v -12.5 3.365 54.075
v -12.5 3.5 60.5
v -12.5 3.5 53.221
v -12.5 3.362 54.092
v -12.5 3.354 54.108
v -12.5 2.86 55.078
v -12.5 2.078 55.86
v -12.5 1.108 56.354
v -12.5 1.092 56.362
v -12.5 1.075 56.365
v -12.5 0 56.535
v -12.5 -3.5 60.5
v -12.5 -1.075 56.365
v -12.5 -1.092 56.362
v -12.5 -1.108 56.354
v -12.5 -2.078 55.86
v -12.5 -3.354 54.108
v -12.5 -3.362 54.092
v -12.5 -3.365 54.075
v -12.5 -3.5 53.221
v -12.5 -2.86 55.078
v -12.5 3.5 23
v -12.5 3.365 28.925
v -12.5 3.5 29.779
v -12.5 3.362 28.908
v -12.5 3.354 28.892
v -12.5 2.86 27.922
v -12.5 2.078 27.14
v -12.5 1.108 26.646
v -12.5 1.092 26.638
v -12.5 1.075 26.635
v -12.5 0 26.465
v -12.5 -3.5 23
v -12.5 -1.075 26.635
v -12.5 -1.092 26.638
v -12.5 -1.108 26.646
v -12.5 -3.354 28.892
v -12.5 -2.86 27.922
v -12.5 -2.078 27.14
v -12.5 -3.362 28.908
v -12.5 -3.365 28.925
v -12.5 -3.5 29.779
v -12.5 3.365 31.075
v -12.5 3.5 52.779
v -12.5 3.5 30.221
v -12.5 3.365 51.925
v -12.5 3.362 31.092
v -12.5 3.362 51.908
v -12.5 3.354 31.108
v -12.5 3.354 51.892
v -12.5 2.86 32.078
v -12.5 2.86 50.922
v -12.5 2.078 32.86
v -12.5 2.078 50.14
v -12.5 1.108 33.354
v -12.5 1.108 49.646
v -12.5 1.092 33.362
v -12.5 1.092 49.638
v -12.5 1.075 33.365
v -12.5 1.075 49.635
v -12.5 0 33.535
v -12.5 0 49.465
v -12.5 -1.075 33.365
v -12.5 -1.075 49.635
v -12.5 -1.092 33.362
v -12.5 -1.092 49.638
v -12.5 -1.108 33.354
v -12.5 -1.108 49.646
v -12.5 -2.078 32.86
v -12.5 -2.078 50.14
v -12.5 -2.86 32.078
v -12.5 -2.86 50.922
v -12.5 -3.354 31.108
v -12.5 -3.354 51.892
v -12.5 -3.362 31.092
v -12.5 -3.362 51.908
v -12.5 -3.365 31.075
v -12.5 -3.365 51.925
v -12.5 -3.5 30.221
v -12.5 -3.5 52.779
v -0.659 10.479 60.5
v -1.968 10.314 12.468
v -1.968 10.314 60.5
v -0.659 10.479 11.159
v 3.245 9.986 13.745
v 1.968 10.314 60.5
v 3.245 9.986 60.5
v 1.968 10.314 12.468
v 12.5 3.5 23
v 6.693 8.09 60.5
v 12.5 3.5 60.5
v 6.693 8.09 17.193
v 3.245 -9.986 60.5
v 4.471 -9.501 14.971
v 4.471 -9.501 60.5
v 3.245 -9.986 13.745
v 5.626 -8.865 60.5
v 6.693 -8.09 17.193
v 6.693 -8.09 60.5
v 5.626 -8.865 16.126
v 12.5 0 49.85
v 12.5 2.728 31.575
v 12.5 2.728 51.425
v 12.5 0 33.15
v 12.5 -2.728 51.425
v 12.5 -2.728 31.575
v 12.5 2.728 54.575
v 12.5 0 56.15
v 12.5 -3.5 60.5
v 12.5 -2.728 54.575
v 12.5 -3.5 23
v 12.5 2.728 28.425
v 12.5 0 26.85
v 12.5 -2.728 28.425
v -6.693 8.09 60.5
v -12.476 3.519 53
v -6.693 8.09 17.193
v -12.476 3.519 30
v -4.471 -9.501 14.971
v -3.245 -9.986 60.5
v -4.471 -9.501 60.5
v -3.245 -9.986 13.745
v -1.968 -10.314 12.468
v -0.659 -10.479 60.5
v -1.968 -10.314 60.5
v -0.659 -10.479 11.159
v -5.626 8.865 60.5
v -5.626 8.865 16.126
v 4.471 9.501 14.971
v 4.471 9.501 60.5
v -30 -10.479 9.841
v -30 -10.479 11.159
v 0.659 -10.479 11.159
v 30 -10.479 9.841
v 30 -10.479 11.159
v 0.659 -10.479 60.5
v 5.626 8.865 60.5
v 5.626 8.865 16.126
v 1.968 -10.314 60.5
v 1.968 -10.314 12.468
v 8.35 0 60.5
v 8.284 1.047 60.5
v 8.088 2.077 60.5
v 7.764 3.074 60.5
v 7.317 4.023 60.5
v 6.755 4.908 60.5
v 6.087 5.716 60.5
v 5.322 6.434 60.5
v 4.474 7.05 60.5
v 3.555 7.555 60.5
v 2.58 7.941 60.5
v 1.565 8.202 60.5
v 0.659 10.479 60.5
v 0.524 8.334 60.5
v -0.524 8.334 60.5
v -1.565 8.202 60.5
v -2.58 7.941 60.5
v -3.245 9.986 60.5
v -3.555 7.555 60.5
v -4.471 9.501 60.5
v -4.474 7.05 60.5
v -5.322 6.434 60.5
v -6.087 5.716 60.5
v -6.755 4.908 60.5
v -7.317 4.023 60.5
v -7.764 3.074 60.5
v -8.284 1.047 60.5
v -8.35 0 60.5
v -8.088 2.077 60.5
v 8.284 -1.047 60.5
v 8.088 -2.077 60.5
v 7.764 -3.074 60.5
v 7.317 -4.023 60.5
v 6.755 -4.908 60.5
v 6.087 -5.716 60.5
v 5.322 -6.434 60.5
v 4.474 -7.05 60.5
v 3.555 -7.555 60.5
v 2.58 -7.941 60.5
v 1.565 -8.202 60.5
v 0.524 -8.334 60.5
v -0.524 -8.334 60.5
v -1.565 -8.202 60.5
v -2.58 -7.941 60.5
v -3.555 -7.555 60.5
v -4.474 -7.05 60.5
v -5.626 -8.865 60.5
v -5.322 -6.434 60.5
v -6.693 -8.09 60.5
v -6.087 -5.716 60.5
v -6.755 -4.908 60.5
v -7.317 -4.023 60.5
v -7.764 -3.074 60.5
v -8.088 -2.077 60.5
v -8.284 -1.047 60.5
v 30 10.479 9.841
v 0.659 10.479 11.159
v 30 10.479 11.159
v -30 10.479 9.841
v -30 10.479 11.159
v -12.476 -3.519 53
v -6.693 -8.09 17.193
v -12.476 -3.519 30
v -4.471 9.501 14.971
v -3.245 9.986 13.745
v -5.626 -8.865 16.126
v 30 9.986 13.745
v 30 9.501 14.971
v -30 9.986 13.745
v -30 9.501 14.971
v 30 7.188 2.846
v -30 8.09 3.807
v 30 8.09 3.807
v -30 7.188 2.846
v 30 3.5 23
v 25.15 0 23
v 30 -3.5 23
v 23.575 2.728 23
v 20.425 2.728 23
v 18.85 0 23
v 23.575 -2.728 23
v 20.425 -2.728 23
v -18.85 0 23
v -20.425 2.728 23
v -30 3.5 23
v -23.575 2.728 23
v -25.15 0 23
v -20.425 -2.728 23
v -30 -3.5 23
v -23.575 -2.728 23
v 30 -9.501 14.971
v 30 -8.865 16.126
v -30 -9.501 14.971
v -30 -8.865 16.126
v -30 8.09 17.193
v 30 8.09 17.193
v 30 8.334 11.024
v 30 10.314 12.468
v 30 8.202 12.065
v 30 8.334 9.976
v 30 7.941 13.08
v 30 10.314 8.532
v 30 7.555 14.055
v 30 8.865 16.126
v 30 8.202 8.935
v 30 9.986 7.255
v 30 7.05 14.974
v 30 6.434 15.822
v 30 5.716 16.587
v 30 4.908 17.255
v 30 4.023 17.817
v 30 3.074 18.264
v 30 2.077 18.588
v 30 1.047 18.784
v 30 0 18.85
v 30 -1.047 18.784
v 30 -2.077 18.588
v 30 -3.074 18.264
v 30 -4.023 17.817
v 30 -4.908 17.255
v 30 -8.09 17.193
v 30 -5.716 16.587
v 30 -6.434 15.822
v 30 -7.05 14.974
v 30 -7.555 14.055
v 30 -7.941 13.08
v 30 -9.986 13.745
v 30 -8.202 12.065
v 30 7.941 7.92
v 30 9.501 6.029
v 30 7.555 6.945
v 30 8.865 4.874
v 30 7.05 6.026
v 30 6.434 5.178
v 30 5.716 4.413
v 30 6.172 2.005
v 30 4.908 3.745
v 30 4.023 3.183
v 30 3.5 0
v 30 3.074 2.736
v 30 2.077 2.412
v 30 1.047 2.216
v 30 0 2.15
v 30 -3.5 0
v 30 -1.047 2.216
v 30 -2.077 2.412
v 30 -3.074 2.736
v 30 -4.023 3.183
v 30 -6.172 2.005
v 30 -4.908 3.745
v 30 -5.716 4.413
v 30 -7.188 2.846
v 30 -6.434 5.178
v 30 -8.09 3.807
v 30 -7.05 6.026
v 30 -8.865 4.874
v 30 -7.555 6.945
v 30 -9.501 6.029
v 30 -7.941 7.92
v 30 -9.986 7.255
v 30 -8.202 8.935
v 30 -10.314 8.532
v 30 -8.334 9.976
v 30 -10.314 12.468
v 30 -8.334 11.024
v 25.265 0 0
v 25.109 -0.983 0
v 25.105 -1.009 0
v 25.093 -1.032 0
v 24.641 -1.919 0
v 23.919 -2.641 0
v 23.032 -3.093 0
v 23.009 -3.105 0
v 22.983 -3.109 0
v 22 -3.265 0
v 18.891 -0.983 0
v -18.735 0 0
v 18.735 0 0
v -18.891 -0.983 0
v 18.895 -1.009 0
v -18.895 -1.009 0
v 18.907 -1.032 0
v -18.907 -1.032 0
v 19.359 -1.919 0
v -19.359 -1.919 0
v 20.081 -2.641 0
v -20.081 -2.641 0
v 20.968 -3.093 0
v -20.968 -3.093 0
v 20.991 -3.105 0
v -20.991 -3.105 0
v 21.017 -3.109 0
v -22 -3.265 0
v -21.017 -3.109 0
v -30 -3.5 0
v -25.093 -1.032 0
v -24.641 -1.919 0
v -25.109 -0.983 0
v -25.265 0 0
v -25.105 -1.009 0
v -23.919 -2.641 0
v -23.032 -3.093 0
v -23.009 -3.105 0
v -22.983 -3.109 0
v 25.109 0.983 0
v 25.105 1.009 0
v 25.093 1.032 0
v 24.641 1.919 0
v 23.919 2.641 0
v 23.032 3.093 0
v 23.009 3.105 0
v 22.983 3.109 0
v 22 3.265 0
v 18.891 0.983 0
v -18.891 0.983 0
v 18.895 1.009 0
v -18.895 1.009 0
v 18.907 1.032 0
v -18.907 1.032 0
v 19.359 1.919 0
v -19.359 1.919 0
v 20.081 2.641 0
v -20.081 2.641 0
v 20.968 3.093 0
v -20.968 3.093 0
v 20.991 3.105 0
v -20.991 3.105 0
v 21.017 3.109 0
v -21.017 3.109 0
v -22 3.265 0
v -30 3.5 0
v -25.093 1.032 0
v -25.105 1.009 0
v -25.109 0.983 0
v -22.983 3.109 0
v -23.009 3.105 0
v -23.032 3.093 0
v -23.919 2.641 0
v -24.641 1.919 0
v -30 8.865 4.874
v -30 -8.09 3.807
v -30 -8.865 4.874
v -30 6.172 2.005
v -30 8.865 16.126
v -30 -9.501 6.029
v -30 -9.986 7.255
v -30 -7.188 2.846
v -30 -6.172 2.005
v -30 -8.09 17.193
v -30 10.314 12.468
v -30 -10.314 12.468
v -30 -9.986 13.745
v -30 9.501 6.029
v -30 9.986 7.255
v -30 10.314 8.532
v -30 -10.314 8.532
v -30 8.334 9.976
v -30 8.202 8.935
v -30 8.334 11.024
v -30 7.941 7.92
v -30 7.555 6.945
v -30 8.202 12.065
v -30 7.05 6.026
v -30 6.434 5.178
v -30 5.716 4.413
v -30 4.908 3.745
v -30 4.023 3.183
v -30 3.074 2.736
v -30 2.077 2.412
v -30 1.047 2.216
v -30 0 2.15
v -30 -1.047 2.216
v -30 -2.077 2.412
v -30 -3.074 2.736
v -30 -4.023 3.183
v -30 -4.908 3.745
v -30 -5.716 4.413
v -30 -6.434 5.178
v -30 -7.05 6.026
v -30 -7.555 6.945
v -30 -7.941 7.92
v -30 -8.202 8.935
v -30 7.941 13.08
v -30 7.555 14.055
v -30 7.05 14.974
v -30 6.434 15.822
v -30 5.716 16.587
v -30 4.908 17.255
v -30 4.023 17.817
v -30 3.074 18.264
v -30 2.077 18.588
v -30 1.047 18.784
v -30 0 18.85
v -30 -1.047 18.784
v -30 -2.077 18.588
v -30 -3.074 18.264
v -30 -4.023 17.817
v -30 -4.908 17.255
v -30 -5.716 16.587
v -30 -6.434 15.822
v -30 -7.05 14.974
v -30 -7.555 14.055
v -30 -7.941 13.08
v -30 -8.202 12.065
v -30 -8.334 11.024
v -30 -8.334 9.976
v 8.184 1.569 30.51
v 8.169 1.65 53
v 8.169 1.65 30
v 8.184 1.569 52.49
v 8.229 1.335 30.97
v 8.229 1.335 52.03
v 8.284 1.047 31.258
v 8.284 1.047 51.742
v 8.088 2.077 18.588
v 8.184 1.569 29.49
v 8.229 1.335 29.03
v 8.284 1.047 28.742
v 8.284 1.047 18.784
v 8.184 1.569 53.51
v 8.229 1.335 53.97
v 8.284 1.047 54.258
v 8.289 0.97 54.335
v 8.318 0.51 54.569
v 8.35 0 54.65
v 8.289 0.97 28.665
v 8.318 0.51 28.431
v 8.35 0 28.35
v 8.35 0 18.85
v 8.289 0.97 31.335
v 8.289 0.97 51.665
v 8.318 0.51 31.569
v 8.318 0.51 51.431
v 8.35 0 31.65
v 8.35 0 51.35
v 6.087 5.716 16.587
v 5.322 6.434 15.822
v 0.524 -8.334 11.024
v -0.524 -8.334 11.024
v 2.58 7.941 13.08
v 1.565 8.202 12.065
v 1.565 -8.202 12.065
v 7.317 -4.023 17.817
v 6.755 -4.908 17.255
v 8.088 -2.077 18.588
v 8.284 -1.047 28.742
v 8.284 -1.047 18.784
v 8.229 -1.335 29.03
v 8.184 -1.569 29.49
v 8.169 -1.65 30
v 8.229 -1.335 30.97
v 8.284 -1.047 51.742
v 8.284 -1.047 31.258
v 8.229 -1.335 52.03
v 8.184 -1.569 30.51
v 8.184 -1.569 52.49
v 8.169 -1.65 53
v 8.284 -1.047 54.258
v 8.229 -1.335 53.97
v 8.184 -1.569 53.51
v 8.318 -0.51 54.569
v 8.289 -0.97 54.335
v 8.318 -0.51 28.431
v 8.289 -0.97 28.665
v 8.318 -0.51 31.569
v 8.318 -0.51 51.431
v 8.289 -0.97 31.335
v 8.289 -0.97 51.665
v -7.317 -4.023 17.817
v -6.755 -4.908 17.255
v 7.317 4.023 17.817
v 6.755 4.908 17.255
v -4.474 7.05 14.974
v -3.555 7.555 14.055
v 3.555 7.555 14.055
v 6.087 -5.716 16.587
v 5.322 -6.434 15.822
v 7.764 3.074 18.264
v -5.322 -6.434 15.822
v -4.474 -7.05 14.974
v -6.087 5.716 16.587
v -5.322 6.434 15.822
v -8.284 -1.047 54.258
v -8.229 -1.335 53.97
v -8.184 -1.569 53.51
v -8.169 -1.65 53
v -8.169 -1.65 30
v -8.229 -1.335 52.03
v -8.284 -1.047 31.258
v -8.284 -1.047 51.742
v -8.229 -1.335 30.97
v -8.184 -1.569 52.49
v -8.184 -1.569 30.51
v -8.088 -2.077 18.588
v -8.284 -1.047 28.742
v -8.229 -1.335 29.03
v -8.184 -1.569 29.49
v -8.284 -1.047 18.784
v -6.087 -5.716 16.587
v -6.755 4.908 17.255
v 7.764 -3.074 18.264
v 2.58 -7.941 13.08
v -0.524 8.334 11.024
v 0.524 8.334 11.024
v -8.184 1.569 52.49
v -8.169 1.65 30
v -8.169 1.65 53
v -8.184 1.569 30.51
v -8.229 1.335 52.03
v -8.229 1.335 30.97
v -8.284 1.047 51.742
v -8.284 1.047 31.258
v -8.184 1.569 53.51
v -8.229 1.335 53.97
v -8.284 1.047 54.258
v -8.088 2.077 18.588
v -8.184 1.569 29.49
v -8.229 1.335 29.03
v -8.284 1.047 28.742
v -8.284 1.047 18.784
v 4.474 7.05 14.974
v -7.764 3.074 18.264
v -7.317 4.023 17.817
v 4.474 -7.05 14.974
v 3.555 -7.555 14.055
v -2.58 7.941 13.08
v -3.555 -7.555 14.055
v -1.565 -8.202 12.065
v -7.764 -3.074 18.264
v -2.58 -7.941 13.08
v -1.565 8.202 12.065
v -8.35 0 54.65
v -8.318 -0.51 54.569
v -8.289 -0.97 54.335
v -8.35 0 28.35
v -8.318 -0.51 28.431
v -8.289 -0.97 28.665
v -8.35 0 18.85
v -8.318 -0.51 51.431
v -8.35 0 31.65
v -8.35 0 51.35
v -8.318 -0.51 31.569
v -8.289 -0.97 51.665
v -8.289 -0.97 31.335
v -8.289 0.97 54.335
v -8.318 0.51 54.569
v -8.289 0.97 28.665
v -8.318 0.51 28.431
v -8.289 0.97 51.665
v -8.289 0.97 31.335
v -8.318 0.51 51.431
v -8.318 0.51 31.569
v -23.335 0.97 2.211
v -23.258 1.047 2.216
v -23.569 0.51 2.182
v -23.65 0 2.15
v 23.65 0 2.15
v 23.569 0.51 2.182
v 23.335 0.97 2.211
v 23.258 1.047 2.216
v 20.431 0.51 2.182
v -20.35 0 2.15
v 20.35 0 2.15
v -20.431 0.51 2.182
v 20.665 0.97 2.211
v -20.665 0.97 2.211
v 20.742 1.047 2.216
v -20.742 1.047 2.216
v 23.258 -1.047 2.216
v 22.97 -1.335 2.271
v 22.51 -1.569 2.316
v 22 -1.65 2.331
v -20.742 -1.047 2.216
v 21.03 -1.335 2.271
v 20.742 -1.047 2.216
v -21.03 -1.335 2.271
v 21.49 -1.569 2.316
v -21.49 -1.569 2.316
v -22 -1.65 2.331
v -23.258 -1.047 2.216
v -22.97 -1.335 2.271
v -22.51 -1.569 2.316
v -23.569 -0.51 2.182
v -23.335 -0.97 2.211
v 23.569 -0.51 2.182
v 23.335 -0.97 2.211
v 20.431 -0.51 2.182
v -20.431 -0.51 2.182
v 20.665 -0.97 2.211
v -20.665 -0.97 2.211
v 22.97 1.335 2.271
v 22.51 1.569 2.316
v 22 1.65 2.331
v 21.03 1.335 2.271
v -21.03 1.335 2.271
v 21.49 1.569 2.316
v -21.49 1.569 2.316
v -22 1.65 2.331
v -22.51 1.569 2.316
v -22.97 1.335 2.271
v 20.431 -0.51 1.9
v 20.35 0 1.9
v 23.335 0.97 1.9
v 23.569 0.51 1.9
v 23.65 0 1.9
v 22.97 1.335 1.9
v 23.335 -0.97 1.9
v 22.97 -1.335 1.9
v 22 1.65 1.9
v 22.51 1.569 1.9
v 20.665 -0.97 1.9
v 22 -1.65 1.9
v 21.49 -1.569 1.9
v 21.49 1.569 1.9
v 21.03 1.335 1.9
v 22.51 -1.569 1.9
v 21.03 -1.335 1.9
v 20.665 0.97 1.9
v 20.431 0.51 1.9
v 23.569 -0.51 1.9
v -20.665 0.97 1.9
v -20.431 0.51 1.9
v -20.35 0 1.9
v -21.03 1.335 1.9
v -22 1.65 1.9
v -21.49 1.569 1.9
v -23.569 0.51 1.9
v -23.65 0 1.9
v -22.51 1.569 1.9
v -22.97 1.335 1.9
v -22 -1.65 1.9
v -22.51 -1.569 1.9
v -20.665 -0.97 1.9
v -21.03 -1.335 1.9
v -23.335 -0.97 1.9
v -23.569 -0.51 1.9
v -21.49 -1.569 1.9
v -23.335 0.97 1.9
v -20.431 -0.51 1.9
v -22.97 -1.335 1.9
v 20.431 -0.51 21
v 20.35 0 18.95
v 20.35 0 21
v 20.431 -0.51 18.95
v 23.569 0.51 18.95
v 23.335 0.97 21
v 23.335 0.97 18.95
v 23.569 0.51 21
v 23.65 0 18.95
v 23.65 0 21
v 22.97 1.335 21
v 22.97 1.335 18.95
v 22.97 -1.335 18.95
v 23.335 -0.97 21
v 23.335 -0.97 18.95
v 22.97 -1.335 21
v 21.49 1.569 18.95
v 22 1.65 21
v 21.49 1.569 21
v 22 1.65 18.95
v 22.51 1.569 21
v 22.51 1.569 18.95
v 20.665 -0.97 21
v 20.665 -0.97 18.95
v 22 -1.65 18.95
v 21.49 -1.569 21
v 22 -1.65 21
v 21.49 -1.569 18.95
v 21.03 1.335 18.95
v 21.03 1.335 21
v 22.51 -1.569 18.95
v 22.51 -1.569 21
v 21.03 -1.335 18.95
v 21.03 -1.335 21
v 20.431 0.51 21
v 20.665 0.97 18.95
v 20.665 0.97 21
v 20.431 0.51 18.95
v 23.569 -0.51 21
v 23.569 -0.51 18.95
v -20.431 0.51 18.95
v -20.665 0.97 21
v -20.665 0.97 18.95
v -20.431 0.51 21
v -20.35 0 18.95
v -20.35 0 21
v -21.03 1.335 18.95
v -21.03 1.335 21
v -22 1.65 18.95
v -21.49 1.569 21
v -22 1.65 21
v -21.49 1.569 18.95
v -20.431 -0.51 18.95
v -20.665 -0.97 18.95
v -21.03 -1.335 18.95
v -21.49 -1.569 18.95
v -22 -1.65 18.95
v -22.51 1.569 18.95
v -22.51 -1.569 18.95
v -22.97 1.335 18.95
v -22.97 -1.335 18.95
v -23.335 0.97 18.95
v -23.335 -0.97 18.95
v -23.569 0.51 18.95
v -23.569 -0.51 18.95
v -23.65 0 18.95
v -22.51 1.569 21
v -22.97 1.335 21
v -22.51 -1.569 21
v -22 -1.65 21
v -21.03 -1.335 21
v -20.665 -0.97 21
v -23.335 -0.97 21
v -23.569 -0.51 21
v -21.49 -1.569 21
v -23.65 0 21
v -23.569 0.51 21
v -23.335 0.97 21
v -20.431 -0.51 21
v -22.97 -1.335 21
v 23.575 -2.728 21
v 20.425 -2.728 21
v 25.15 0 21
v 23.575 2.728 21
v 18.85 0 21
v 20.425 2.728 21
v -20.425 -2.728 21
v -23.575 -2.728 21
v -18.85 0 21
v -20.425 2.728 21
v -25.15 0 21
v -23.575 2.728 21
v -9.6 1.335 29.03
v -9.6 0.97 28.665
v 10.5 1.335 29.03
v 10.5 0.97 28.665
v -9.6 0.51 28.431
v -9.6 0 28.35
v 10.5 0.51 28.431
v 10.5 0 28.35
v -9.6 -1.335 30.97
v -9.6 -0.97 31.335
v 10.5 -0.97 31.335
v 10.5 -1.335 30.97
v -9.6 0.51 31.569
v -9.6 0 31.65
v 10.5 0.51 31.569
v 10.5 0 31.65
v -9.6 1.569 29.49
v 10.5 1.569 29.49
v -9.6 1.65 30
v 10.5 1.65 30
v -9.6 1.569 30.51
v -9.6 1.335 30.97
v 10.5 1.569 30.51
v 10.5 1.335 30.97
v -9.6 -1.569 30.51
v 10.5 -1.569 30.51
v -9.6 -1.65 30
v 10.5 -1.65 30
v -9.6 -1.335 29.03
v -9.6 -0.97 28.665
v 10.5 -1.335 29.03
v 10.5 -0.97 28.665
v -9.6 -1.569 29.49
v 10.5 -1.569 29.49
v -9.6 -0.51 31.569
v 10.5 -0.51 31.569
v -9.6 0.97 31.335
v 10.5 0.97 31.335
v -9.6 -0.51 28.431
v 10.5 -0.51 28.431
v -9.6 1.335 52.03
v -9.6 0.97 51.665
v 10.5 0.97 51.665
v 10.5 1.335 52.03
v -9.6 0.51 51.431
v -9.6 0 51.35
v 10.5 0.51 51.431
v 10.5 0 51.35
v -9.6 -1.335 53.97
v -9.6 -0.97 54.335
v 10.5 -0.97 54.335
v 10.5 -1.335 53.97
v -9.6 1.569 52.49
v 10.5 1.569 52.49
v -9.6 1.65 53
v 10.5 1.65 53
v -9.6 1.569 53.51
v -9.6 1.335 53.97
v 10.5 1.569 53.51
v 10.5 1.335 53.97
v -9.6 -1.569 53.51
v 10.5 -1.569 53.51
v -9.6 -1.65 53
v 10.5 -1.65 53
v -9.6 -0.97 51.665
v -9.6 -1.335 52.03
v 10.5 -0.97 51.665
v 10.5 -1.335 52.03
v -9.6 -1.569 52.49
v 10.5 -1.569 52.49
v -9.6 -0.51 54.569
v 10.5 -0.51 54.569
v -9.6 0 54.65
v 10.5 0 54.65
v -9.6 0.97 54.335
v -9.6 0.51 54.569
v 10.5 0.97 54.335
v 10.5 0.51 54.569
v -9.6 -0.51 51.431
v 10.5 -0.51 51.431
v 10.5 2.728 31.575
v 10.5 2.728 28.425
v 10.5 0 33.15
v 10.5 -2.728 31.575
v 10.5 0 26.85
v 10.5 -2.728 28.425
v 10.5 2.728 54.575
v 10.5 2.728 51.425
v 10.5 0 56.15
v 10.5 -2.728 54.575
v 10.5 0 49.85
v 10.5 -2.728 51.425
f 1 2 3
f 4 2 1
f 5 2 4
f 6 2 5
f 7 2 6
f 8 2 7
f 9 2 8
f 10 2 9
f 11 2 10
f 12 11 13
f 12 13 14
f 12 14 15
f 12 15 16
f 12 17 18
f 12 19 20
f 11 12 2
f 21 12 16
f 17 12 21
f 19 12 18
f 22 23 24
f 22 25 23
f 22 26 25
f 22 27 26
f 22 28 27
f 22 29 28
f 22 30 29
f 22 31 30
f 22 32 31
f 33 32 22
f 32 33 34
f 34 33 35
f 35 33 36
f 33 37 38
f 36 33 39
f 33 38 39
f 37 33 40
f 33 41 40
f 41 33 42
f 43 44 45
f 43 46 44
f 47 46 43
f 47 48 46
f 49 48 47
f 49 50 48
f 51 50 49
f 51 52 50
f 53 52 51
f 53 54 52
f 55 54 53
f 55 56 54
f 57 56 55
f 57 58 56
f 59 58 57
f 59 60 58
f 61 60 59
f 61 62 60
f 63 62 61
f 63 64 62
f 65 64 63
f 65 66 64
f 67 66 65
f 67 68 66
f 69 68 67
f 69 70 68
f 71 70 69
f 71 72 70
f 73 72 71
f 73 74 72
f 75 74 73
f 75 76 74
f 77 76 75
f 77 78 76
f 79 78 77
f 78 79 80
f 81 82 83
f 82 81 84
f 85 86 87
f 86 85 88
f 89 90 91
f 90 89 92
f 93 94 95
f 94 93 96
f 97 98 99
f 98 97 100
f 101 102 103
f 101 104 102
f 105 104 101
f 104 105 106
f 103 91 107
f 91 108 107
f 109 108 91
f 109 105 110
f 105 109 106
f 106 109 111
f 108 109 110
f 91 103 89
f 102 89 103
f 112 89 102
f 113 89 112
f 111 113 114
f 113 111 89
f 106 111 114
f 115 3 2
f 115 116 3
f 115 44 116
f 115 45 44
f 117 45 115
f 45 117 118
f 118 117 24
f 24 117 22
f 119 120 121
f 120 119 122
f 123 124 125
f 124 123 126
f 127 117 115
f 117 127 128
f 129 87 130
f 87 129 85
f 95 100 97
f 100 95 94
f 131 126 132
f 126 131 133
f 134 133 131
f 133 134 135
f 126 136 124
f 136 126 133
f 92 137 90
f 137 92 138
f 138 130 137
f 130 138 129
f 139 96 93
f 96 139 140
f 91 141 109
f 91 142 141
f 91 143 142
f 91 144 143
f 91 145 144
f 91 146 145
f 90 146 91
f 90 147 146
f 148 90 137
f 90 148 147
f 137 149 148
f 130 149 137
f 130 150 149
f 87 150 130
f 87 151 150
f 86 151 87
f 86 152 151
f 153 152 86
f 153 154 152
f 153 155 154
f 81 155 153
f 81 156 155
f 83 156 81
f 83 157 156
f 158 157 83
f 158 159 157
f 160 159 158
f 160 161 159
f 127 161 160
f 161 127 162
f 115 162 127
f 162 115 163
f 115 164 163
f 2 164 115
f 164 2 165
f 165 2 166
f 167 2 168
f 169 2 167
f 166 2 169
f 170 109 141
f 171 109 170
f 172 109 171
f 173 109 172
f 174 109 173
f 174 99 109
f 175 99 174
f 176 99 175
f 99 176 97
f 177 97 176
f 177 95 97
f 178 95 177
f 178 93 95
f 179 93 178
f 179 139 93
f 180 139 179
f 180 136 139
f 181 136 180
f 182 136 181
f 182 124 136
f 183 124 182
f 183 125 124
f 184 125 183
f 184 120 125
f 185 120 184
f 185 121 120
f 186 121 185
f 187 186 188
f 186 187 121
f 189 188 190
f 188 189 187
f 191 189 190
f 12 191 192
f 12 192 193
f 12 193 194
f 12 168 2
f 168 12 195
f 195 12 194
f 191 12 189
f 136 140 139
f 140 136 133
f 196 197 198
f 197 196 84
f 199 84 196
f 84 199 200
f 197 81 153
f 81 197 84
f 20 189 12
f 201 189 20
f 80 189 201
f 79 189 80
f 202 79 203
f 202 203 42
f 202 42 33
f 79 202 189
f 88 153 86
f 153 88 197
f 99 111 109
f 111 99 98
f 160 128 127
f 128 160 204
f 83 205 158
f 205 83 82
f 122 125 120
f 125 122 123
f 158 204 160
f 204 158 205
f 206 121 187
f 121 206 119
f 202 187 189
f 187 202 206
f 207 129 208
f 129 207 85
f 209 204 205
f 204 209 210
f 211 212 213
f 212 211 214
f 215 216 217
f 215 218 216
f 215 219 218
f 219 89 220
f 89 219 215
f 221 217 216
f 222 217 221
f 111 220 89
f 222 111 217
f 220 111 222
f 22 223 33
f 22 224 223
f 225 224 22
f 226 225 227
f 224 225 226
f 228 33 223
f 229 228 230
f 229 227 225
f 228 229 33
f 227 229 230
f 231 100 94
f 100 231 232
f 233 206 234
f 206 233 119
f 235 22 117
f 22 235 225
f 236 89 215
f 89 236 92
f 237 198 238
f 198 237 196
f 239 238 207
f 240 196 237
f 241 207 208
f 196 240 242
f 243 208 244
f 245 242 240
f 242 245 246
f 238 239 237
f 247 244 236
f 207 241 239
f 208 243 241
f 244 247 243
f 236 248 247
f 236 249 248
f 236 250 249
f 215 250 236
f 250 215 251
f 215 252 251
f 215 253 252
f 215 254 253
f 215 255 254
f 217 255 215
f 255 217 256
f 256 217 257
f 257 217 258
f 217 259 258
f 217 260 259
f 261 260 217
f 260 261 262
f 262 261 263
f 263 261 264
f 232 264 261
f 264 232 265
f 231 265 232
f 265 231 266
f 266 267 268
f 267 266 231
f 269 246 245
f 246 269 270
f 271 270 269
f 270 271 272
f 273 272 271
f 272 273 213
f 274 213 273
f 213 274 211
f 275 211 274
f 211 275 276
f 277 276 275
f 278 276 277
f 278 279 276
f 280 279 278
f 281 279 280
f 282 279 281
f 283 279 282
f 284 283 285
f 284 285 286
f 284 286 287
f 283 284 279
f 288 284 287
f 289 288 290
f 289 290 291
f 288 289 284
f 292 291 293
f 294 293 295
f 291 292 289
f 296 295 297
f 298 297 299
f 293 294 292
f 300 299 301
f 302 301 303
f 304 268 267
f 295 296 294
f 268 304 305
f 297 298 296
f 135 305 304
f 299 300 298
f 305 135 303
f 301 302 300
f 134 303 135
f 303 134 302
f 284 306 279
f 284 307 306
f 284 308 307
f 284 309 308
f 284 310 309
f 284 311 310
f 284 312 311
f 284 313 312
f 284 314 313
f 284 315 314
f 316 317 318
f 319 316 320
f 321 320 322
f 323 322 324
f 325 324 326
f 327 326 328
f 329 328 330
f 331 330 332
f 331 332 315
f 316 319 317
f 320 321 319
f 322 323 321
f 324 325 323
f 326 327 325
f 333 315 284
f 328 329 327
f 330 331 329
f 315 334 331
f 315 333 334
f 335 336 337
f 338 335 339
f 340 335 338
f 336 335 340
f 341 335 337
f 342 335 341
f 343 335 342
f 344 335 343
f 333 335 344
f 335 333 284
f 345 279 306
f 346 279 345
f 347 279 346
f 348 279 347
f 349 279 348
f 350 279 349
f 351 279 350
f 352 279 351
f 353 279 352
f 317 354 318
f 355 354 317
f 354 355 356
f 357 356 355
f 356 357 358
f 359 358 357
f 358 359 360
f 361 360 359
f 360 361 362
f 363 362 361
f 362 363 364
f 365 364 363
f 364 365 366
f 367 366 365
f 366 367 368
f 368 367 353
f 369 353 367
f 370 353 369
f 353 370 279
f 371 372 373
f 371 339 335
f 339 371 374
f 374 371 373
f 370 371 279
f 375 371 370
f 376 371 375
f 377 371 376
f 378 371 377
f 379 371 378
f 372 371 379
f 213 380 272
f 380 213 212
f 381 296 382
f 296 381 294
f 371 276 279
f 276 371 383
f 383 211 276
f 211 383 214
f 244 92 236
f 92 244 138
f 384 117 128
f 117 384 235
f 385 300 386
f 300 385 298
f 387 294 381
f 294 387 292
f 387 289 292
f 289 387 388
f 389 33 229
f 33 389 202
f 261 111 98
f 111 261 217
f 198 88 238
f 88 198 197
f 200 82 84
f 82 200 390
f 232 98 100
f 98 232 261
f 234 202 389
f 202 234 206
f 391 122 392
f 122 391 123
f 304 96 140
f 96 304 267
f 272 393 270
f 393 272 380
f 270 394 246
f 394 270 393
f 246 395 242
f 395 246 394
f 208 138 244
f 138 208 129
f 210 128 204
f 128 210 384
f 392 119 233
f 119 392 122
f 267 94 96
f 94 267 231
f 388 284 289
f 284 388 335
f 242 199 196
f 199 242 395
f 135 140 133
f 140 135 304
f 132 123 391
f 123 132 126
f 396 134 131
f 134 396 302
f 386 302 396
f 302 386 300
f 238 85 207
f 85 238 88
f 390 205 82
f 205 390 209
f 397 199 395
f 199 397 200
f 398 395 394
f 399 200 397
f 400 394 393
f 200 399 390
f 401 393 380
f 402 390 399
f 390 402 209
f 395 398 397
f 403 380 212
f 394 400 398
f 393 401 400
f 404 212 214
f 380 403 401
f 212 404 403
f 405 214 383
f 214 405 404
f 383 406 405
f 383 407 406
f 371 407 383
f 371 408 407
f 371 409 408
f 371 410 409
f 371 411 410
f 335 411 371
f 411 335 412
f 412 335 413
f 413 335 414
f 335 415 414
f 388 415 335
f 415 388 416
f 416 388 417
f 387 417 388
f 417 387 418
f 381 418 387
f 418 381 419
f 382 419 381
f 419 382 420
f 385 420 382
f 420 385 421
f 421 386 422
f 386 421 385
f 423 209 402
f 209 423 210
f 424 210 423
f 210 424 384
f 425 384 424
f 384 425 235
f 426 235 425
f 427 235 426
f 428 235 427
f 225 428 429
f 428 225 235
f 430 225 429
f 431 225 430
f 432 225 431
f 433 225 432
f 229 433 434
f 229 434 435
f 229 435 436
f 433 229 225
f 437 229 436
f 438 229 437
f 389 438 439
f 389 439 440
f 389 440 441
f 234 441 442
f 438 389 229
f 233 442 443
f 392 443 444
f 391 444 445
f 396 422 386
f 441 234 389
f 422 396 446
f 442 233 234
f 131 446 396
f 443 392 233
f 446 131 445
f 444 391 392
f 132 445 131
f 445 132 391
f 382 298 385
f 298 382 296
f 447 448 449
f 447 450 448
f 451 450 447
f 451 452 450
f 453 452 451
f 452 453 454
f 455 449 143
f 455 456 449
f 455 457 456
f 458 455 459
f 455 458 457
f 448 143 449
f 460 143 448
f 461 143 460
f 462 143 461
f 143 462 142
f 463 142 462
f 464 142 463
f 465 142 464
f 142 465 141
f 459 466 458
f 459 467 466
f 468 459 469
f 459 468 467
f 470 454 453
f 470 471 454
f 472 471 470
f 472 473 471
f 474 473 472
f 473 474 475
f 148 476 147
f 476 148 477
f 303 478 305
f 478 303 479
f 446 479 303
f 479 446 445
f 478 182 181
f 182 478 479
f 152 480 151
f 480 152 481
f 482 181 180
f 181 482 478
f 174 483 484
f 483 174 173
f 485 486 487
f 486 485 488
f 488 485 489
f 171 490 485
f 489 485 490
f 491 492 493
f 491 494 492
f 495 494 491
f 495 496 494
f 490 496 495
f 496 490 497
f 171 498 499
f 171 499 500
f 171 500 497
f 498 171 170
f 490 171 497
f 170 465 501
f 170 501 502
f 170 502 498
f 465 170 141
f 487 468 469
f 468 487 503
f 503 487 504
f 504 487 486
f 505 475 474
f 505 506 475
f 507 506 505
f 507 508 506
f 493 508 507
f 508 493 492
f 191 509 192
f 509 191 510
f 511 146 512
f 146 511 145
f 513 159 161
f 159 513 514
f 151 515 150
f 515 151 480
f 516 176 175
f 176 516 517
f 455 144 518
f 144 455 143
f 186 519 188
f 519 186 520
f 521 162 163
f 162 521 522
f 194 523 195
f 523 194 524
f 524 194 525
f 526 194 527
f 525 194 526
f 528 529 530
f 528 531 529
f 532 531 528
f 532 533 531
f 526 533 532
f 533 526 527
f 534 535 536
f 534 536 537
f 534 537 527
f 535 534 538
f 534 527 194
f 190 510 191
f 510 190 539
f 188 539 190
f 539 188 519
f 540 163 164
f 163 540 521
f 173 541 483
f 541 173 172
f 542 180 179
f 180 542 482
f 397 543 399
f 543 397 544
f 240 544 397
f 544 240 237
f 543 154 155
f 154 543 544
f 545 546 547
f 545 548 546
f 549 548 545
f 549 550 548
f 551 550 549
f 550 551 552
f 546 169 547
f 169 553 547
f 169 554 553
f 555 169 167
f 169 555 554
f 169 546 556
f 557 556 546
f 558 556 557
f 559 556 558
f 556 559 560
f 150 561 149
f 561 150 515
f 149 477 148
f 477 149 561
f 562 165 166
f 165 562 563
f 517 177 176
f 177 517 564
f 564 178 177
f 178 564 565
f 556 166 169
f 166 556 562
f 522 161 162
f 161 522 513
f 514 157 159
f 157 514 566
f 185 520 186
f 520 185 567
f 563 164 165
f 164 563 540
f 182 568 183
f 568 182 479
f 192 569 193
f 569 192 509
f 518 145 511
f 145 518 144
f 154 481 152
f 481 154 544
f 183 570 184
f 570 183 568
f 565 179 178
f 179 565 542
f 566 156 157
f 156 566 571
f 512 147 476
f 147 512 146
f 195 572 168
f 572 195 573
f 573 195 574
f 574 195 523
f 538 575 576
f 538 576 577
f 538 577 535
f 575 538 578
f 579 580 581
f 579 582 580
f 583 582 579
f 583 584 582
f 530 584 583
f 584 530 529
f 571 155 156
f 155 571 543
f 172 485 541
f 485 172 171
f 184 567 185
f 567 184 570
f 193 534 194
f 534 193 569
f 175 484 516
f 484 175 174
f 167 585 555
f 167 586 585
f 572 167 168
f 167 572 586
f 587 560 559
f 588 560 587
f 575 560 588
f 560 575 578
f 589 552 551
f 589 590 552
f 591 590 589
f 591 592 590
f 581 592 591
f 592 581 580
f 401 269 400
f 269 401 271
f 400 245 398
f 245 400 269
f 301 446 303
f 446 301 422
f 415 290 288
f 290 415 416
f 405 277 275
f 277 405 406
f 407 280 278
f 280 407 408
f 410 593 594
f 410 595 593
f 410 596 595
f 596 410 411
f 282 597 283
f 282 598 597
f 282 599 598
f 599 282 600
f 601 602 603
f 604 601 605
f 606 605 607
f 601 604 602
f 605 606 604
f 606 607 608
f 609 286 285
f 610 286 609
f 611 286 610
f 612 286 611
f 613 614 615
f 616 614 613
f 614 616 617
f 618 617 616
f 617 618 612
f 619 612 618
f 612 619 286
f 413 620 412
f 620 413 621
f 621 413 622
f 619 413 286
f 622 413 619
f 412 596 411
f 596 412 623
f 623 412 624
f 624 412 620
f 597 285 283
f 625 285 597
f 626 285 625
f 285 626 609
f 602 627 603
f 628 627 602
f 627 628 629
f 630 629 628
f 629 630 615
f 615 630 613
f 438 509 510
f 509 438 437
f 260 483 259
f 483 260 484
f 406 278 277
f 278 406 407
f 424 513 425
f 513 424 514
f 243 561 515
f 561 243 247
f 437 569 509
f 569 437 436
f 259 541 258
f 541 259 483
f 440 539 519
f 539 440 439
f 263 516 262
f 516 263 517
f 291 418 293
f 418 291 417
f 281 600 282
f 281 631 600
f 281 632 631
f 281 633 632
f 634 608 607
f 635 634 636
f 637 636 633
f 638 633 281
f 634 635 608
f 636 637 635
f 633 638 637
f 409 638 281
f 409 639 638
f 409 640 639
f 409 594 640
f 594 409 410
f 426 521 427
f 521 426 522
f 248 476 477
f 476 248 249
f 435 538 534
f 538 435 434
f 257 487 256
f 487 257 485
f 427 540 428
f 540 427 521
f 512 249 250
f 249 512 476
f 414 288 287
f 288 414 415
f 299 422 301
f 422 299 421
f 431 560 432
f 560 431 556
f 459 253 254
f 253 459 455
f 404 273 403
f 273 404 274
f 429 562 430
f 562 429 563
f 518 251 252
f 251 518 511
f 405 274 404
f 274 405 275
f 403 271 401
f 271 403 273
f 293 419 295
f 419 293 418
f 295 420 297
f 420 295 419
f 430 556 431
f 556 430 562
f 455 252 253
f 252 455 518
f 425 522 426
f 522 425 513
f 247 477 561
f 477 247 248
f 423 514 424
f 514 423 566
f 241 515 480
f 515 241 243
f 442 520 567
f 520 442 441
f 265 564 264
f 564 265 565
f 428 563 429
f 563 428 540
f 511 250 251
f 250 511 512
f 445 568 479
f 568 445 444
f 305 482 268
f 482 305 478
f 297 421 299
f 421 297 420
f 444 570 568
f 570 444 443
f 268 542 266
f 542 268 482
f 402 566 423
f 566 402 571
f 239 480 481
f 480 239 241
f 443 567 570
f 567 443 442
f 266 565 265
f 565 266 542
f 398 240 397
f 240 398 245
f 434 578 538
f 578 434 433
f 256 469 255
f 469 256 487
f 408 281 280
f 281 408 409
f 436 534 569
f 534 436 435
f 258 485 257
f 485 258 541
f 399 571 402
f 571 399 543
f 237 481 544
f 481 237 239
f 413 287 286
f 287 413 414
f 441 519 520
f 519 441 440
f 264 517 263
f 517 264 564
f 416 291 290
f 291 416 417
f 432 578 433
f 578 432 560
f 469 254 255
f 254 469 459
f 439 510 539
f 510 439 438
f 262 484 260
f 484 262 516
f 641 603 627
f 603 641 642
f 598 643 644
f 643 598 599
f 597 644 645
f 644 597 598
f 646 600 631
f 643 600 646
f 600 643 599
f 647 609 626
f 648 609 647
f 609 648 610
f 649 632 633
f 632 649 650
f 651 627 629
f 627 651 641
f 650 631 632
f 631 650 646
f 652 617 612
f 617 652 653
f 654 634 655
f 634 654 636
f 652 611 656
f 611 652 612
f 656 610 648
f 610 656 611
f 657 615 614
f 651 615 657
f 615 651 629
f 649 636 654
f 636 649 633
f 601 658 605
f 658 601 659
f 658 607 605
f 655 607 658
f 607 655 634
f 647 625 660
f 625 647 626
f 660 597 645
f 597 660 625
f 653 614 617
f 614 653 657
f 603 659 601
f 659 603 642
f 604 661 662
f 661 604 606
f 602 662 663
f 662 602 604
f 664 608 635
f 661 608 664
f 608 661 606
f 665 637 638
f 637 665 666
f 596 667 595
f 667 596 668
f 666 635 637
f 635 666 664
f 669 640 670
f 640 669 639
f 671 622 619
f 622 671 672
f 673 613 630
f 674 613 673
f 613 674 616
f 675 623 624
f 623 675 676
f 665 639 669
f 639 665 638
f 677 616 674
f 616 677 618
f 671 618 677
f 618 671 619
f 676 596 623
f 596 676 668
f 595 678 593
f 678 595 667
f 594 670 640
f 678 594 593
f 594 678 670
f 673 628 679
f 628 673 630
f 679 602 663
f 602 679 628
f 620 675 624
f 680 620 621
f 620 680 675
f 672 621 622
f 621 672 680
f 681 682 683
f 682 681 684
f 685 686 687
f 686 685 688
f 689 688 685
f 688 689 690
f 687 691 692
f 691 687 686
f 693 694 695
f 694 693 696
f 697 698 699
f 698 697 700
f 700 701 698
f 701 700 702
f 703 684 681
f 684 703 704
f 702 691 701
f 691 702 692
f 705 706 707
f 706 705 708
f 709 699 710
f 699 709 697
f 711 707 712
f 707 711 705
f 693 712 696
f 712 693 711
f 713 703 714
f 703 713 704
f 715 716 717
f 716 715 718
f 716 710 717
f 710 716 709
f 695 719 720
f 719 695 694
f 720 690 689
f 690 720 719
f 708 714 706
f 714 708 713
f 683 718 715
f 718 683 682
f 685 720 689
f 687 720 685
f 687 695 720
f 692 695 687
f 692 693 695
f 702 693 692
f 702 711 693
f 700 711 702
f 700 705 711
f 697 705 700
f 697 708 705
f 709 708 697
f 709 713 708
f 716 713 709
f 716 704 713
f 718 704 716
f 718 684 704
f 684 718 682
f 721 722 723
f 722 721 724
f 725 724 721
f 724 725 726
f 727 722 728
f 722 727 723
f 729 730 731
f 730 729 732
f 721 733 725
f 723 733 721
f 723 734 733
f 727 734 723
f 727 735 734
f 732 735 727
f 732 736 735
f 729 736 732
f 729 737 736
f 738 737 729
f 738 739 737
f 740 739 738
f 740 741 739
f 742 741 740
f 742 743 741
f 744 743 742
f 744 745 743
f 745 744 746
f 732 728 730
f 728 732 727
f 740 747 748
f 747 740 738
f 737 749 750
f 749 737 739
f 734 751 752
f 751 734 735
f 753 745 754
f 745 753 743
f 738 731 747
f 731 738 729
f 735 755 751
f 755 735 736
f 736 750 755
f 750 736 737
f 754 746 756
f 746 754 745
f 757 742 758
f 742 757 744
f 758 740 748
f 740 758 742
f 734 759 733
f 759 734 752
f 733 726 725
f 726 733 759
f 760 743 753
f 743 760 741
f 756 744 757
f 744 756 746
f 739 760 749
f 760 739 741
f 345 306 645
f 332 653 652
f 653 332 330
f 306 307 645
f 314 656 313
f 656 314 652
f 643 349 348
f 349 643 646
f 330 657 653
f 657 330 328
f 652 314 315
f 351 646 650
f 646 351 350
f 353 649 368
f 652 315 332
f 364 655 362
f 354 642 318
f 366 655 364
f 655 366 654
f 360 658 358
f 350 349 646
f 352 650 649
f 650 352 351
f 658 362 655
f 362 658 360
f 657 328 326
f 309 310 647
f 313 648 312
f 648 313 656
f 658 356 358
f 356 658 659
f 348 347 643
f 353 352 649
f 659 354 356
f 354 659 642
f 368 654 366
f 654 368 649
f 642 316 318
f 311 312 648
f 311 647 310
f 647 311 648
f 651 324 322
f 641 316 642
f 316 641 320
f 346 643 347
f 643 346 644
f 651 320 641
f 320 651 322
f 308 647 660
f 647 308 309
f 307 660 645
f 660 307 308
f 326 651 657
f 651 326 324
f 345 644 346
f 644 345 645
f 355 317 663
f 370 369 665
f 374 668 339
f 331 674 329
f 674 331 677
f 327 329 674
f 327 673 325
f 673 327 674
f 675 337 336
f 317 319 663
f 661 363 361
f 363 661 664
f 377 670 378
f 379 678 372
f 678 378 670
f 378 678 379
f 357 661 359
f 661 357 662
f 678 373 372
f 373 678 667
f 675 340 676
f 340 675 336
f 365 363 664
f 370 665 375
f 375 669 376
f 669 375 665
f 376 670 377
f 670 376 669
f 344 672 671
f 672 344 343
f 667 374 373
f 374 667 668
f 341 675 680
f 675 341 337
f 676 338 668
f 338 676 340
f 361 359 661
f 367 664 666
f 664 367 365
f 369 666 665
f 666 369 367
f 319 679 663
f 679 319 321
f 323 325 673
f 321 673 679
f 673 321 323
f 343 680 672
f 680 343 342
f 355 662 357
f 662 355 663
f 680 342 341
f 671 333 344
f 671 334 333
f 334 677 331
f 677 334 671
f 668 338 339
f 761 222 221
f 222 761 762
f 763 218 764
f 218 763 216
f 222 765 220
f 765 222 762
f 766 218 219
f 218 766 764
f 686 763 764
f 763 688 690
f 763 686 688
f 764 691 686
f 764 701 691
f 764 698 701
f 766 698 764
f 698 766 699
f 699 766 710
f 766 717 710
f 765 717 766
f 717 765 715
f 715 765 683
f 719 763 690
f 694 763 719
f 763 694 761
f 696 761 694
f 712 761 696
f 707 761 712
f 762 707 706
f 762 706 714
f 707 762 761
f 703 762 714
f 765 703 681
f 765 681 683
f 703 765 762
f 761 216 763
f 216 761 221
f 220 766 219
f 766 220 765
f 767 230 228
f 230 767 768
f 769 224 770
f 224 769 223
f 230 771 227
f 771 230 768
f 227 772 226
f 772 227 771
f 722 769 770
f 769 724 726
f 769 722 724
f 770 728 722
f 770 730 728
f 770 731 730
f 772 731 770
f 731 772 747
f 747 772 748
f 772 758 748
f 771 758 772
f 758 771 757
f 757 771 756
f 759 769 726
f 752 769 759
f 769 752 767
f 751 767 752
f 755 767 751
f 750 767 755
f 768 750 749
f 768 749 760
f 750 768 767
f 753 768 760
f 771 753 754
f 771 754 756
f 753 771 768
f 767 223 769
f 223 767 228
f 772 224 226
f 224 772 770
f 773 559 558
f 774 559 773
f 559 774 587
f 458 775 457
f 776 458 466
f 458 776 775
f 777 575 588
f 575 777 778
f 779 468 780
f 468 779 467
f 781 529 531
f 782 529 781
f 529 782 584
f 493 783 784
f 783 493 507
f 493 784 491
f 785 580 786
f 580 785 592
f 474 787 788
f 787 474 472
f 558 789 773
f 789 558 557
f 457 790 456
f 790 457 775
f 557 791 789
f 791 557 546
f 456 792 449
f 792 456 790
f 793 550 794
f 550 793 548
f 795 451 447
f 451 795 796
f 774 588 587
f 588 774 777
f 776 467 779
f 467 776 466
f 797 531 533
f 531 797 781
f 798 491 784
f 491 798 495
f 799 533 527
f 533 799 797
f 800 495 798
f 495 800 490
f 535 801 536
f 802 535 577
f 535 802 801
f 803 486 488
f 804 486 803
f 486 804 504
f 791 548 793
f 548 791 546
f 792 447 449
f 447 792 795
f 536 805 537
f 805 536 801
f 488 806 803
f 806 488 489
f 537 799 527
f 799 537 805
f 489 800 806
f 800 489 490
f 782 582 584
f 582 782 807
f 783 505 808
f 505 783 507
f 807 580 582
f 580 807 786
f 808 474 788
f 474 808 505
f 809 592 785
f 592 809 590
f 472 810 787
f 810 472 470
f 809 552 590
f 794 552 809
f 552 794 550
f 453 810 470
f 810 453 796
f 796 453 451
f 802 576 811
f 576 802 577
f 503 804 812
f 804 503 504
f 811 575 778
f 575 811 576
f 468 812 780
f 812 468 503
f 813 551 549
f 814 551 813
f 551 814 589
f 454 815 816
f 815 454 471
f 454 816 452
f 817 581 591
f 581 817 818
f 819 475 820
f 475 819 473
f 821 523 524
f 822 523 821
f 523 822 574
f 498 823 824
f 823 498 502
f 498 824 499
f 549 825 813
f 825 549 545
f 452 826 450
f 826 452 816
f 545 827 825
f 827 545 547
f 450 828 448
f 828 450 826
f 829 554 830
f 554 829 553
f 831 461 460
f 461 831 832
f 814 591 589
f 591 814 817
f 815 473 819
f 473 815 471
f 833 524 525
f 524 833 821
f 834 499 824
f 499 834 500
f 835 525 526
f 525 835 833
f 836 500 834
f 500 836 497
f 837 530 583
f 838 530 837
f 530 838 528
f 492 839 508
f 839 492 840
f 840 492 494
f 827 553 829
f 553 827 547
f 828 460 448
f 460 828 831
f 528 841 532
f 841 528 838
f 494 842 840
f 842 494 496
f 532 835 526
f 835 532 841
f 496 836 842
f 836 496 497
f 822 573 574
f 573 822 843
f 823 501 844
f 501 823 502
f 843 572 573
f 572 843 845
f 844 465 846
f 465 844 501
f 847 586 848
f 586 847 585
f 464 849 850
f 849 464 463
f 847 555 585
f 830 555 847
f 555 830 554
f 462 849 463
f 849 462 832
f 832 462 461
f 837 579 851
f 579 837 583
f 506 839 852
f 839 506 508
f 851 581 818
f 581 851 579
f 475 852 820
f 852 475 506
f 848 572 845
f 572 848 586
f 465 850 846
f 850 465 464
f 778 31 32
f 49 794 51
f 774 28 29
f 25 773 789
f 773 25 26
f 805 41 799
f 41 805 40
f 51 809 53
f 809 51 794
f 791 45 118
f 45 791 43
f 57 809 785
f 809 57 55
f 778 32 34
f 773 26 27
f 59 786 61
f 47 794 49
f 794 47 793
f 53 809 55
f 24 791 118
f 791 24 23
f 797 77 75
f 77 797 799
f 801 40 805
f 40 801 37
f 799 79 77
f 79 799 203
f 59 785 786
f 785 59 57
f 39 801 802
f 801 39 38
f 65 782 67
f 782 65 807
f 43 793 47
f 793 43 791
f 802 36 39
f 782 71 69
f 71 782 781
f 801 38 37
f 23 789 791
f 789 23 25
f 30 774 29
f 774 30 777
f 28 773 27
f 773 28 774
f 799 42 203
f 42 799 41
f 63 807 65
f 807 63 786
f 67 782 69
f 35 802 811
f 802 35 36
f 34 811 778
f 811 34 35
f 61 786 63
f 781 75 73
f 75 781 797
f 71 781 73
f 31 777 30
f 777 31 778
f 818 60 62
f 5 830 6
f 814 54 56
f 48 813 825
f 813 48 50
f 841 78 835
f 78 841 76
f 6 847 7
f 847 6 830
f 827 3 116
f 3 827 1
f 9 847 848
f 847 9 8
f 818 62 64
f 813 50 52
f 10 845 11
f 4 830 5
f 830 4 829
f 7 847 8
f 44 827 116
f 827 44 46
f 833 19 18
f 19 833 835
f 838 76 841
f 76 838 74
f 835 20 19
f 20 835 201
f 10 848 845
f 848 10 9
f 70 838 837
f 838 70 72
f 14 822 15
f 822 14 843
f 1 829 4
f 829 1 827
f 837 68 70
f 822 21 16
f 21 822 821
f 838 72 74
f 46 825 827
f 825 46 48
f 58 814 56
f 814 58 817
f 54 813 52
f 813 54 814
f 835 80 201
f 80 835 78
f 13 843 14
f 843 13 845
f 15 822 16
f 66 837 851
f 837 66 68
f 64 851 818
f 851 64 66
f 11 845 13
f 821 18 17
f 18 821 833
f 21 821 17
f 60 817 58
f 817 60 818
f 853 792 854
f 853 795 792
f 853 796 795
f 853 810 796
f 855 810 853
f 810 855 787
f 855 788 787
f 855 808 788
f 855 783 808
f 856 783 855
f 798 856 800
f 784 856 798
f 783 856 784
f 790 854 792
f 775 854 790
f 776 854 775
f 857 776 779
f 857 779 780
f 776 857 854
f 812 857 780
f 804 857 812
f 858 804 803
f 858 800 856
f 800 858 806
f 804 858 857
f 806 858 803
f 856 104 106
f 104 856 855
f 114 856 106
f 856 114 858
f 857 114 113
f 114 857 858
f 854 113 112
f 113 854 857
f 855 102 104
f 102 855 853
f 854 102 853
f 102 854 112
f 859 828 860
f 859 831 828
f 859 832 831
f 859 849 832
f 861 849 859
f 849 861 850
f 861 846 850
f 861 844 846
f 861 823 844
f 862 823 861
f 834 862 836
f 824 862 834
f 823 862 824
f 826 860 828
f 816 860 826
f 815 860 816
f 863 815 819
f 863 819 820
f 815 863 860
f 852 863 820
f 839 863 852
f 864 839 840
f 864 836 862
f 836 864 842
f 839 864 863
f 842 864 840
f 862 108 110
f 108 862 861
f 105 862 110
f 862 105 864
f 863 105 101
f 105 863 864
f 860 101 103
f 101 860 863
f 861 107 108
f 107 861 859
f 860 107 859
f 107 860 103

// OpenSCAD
// file: ../Dollo/NEW_long_ties/globals.scad
/*
Most things in this file is represented as one millimeter, so keep that in mind while changing things.
Some of the setting are not mm but at variables that you can set, such as 2*x=2x and you are setting what x is.
I will try to specify when things are variables and not exact measurements.
*/

// printer slop
slop = 0.15;

obj_leg = 30;
leg_length = 5.5;
small_number = 0.001;
metal_core_rode_global = 5;


///////////////// number of holes /////////////////////
z_hole_number = 8;
other_holes = 8;

///////////////// Pins /////////////////////

//pins that poke out
ball_size = 10;
pin_height = 20;
pin_diameter = 6;


//holes
hole_ball_size = ball_size;
hole_pin_height = pin_height;
hole_pin_diameter = pin_diameter;

///////////////// Z THINGS /////////////////////

berring_slot_width = 7.5;
berring_slot_depth = 6.5;
metal_core_rode = 5;

///////////////// X THINGS /////////////////////

//male dove tails
male_dove_max_width=8;
male_dove_min_width=5;
male_dove_depth=5;
male_dove_height=obj_leg/2;

function scaled_male_dove_max_width() = male_dove_max_width - slop;
function scaled_male_dove_min_width() = male_dove_min_width - slop;
function scaled_male_dove_depth() = male_dove_depth - slop;

//female dove tails, this is found on the y mounts
girl_max_width=11;
girl_min_width=5;
girl_depth=5;
girl_height=obj_leg;


///////////////// Y THINGS /////////////////////
/*
The Y is so normal that all of those global variables at the top should change all of the setting in it, this section is set her incase there are variables set in the future development of this project.
*/

// stepper
motor_side_length = 43.2;
motor_bolt_hole_distance = 31;
motor_center_hole = 23;
motor_shaft_dia = 5;
motor_shaft_hole_dia = 5+2*slop;

// bolts etc.
bolt_hole_dia = 3+2*slop;
bolt_head_hole_dia = 5.8;

m4_bolt_hole_dia = 4+2*slop;
m4_bolt_head_hole_dia = 6.8+2*slop;


m3_nut_side = 5.65;
m3_nut_height = 2.3;
m4_nut_side = 6.85;
m4_nut_height = 3.1;

// threaded rod
lifter_rod_diam = 9.86;
hole_threaded_rod = lifter_rod_diam+2*slop;

// for the extensions
metal_rod_size = 9;
// main file
use <../Dollo/NEW_long_ties/include.scad>;


//clothes_drier_part()
clothes_drier_t_part();


module debug_part() {
    intersection() {
        clothes_drier_part();
        //cube([20, 20, 50]);
    }
}


module clothes_drier_part() {
    difference() {
        hull() {
            cylinder(d=20.5, h=22, $fn=50);

            intersection() {
                cylinder(d=20.5, h=32, $fn=50);

                translate([0, 0, 22 + 3])
                rotate([90, 0, 0])
                cylinder(
                    d=9, h=22, center=true, $fn=30
                );
            }
        }

        cylinder(d=16.25, h=40.8, center=true, $fn=50);

        translate([0, 0, 24])
        rotate([90, 0, 0])
        cylinder(d=4.3, h=30, center=true, $fn=30);
    }

    // support
    tube(9, 20.2, 0.5, $fn=30);
}


module clothes_drier_t_part() {
    difference() {
        union() {
            translate([0, 0, 21/2])
            hull() {
                cylinder(d=21, h=50, $fn=50);

                translate([0, 0, 50/2])
                cube([25, 7, 50], center=true);
            }

            translate([0, 0, 21/2])
            rotate([0, 90, 0])
            hull() {
                cylinder(d=21, h=60, center=true, $fn=50);

                translate([-1, 0, 0])
                cube([23, 7, 60], center=true);
            }
        }

        translate([0, 0, 21/2])
        cylinder(d=16.7, h=70, $fn=50);

        translate([0, 0, 21/2])
        rotate([0, 90, 0])
        cylinder(d=16.7, h=70, center=true, $fn=50);

        translate([22, 0, -1])
        cylinder(d=3.3, h=10, $fn=20);

        translate([-22, 0, -1])
        cylinder(d=3.3, h=10, $fn=20);

        translate([22, 0, (21 - 16.7)/2 + 16.8])
        cylinder(d=3.3, h=10, $fn=20);

        translate([-22, 0, (21 - 16.7)/2 + 16.8])
        cylinder(d=3.3, h=10, $fn=20);

        translate([22, 0, -0.1])
        cylinder(d1=6.7, d2=3.3, h=2, $fn=20);

        translate([-22, 0, -0.1])
        cylinder(d1=6.7, d2=3.3, h=2, $fn=20);

        translate([22, 0, 21])
        M3_nut();

        translate([-22, 0, 21])
        M3_nut();

        translate([0, 0, 30])
        rotate([0, 90, 0])
        cylinder(d=3.3, h=40, center=true, $fn=20);

        translate([0, 0, 53])
        rotate([0, 90, 0])
        cylinder(d=3.3, h=40, center=true, $fn=20);

        translate([-25/2 - 0.1, 0, 30])
        rotate([0, 90, 0])
        cylinder(d1=7.2, d2=3.3, h=3, $fn=20);

        translate([-25/2 - 0.1, 0, 53])
        rotate([0, 90, 0])
        cylinder(d1=7.2, d2=3.3, h=3, $fn=20);

        translate([21/2, 0, 30])
        rotate([0, 90, 0])
        M3_nut();

        translate([21/2, 0, 53])
        rotate([0, 90, 0])
        M3_nut();

    }
}
